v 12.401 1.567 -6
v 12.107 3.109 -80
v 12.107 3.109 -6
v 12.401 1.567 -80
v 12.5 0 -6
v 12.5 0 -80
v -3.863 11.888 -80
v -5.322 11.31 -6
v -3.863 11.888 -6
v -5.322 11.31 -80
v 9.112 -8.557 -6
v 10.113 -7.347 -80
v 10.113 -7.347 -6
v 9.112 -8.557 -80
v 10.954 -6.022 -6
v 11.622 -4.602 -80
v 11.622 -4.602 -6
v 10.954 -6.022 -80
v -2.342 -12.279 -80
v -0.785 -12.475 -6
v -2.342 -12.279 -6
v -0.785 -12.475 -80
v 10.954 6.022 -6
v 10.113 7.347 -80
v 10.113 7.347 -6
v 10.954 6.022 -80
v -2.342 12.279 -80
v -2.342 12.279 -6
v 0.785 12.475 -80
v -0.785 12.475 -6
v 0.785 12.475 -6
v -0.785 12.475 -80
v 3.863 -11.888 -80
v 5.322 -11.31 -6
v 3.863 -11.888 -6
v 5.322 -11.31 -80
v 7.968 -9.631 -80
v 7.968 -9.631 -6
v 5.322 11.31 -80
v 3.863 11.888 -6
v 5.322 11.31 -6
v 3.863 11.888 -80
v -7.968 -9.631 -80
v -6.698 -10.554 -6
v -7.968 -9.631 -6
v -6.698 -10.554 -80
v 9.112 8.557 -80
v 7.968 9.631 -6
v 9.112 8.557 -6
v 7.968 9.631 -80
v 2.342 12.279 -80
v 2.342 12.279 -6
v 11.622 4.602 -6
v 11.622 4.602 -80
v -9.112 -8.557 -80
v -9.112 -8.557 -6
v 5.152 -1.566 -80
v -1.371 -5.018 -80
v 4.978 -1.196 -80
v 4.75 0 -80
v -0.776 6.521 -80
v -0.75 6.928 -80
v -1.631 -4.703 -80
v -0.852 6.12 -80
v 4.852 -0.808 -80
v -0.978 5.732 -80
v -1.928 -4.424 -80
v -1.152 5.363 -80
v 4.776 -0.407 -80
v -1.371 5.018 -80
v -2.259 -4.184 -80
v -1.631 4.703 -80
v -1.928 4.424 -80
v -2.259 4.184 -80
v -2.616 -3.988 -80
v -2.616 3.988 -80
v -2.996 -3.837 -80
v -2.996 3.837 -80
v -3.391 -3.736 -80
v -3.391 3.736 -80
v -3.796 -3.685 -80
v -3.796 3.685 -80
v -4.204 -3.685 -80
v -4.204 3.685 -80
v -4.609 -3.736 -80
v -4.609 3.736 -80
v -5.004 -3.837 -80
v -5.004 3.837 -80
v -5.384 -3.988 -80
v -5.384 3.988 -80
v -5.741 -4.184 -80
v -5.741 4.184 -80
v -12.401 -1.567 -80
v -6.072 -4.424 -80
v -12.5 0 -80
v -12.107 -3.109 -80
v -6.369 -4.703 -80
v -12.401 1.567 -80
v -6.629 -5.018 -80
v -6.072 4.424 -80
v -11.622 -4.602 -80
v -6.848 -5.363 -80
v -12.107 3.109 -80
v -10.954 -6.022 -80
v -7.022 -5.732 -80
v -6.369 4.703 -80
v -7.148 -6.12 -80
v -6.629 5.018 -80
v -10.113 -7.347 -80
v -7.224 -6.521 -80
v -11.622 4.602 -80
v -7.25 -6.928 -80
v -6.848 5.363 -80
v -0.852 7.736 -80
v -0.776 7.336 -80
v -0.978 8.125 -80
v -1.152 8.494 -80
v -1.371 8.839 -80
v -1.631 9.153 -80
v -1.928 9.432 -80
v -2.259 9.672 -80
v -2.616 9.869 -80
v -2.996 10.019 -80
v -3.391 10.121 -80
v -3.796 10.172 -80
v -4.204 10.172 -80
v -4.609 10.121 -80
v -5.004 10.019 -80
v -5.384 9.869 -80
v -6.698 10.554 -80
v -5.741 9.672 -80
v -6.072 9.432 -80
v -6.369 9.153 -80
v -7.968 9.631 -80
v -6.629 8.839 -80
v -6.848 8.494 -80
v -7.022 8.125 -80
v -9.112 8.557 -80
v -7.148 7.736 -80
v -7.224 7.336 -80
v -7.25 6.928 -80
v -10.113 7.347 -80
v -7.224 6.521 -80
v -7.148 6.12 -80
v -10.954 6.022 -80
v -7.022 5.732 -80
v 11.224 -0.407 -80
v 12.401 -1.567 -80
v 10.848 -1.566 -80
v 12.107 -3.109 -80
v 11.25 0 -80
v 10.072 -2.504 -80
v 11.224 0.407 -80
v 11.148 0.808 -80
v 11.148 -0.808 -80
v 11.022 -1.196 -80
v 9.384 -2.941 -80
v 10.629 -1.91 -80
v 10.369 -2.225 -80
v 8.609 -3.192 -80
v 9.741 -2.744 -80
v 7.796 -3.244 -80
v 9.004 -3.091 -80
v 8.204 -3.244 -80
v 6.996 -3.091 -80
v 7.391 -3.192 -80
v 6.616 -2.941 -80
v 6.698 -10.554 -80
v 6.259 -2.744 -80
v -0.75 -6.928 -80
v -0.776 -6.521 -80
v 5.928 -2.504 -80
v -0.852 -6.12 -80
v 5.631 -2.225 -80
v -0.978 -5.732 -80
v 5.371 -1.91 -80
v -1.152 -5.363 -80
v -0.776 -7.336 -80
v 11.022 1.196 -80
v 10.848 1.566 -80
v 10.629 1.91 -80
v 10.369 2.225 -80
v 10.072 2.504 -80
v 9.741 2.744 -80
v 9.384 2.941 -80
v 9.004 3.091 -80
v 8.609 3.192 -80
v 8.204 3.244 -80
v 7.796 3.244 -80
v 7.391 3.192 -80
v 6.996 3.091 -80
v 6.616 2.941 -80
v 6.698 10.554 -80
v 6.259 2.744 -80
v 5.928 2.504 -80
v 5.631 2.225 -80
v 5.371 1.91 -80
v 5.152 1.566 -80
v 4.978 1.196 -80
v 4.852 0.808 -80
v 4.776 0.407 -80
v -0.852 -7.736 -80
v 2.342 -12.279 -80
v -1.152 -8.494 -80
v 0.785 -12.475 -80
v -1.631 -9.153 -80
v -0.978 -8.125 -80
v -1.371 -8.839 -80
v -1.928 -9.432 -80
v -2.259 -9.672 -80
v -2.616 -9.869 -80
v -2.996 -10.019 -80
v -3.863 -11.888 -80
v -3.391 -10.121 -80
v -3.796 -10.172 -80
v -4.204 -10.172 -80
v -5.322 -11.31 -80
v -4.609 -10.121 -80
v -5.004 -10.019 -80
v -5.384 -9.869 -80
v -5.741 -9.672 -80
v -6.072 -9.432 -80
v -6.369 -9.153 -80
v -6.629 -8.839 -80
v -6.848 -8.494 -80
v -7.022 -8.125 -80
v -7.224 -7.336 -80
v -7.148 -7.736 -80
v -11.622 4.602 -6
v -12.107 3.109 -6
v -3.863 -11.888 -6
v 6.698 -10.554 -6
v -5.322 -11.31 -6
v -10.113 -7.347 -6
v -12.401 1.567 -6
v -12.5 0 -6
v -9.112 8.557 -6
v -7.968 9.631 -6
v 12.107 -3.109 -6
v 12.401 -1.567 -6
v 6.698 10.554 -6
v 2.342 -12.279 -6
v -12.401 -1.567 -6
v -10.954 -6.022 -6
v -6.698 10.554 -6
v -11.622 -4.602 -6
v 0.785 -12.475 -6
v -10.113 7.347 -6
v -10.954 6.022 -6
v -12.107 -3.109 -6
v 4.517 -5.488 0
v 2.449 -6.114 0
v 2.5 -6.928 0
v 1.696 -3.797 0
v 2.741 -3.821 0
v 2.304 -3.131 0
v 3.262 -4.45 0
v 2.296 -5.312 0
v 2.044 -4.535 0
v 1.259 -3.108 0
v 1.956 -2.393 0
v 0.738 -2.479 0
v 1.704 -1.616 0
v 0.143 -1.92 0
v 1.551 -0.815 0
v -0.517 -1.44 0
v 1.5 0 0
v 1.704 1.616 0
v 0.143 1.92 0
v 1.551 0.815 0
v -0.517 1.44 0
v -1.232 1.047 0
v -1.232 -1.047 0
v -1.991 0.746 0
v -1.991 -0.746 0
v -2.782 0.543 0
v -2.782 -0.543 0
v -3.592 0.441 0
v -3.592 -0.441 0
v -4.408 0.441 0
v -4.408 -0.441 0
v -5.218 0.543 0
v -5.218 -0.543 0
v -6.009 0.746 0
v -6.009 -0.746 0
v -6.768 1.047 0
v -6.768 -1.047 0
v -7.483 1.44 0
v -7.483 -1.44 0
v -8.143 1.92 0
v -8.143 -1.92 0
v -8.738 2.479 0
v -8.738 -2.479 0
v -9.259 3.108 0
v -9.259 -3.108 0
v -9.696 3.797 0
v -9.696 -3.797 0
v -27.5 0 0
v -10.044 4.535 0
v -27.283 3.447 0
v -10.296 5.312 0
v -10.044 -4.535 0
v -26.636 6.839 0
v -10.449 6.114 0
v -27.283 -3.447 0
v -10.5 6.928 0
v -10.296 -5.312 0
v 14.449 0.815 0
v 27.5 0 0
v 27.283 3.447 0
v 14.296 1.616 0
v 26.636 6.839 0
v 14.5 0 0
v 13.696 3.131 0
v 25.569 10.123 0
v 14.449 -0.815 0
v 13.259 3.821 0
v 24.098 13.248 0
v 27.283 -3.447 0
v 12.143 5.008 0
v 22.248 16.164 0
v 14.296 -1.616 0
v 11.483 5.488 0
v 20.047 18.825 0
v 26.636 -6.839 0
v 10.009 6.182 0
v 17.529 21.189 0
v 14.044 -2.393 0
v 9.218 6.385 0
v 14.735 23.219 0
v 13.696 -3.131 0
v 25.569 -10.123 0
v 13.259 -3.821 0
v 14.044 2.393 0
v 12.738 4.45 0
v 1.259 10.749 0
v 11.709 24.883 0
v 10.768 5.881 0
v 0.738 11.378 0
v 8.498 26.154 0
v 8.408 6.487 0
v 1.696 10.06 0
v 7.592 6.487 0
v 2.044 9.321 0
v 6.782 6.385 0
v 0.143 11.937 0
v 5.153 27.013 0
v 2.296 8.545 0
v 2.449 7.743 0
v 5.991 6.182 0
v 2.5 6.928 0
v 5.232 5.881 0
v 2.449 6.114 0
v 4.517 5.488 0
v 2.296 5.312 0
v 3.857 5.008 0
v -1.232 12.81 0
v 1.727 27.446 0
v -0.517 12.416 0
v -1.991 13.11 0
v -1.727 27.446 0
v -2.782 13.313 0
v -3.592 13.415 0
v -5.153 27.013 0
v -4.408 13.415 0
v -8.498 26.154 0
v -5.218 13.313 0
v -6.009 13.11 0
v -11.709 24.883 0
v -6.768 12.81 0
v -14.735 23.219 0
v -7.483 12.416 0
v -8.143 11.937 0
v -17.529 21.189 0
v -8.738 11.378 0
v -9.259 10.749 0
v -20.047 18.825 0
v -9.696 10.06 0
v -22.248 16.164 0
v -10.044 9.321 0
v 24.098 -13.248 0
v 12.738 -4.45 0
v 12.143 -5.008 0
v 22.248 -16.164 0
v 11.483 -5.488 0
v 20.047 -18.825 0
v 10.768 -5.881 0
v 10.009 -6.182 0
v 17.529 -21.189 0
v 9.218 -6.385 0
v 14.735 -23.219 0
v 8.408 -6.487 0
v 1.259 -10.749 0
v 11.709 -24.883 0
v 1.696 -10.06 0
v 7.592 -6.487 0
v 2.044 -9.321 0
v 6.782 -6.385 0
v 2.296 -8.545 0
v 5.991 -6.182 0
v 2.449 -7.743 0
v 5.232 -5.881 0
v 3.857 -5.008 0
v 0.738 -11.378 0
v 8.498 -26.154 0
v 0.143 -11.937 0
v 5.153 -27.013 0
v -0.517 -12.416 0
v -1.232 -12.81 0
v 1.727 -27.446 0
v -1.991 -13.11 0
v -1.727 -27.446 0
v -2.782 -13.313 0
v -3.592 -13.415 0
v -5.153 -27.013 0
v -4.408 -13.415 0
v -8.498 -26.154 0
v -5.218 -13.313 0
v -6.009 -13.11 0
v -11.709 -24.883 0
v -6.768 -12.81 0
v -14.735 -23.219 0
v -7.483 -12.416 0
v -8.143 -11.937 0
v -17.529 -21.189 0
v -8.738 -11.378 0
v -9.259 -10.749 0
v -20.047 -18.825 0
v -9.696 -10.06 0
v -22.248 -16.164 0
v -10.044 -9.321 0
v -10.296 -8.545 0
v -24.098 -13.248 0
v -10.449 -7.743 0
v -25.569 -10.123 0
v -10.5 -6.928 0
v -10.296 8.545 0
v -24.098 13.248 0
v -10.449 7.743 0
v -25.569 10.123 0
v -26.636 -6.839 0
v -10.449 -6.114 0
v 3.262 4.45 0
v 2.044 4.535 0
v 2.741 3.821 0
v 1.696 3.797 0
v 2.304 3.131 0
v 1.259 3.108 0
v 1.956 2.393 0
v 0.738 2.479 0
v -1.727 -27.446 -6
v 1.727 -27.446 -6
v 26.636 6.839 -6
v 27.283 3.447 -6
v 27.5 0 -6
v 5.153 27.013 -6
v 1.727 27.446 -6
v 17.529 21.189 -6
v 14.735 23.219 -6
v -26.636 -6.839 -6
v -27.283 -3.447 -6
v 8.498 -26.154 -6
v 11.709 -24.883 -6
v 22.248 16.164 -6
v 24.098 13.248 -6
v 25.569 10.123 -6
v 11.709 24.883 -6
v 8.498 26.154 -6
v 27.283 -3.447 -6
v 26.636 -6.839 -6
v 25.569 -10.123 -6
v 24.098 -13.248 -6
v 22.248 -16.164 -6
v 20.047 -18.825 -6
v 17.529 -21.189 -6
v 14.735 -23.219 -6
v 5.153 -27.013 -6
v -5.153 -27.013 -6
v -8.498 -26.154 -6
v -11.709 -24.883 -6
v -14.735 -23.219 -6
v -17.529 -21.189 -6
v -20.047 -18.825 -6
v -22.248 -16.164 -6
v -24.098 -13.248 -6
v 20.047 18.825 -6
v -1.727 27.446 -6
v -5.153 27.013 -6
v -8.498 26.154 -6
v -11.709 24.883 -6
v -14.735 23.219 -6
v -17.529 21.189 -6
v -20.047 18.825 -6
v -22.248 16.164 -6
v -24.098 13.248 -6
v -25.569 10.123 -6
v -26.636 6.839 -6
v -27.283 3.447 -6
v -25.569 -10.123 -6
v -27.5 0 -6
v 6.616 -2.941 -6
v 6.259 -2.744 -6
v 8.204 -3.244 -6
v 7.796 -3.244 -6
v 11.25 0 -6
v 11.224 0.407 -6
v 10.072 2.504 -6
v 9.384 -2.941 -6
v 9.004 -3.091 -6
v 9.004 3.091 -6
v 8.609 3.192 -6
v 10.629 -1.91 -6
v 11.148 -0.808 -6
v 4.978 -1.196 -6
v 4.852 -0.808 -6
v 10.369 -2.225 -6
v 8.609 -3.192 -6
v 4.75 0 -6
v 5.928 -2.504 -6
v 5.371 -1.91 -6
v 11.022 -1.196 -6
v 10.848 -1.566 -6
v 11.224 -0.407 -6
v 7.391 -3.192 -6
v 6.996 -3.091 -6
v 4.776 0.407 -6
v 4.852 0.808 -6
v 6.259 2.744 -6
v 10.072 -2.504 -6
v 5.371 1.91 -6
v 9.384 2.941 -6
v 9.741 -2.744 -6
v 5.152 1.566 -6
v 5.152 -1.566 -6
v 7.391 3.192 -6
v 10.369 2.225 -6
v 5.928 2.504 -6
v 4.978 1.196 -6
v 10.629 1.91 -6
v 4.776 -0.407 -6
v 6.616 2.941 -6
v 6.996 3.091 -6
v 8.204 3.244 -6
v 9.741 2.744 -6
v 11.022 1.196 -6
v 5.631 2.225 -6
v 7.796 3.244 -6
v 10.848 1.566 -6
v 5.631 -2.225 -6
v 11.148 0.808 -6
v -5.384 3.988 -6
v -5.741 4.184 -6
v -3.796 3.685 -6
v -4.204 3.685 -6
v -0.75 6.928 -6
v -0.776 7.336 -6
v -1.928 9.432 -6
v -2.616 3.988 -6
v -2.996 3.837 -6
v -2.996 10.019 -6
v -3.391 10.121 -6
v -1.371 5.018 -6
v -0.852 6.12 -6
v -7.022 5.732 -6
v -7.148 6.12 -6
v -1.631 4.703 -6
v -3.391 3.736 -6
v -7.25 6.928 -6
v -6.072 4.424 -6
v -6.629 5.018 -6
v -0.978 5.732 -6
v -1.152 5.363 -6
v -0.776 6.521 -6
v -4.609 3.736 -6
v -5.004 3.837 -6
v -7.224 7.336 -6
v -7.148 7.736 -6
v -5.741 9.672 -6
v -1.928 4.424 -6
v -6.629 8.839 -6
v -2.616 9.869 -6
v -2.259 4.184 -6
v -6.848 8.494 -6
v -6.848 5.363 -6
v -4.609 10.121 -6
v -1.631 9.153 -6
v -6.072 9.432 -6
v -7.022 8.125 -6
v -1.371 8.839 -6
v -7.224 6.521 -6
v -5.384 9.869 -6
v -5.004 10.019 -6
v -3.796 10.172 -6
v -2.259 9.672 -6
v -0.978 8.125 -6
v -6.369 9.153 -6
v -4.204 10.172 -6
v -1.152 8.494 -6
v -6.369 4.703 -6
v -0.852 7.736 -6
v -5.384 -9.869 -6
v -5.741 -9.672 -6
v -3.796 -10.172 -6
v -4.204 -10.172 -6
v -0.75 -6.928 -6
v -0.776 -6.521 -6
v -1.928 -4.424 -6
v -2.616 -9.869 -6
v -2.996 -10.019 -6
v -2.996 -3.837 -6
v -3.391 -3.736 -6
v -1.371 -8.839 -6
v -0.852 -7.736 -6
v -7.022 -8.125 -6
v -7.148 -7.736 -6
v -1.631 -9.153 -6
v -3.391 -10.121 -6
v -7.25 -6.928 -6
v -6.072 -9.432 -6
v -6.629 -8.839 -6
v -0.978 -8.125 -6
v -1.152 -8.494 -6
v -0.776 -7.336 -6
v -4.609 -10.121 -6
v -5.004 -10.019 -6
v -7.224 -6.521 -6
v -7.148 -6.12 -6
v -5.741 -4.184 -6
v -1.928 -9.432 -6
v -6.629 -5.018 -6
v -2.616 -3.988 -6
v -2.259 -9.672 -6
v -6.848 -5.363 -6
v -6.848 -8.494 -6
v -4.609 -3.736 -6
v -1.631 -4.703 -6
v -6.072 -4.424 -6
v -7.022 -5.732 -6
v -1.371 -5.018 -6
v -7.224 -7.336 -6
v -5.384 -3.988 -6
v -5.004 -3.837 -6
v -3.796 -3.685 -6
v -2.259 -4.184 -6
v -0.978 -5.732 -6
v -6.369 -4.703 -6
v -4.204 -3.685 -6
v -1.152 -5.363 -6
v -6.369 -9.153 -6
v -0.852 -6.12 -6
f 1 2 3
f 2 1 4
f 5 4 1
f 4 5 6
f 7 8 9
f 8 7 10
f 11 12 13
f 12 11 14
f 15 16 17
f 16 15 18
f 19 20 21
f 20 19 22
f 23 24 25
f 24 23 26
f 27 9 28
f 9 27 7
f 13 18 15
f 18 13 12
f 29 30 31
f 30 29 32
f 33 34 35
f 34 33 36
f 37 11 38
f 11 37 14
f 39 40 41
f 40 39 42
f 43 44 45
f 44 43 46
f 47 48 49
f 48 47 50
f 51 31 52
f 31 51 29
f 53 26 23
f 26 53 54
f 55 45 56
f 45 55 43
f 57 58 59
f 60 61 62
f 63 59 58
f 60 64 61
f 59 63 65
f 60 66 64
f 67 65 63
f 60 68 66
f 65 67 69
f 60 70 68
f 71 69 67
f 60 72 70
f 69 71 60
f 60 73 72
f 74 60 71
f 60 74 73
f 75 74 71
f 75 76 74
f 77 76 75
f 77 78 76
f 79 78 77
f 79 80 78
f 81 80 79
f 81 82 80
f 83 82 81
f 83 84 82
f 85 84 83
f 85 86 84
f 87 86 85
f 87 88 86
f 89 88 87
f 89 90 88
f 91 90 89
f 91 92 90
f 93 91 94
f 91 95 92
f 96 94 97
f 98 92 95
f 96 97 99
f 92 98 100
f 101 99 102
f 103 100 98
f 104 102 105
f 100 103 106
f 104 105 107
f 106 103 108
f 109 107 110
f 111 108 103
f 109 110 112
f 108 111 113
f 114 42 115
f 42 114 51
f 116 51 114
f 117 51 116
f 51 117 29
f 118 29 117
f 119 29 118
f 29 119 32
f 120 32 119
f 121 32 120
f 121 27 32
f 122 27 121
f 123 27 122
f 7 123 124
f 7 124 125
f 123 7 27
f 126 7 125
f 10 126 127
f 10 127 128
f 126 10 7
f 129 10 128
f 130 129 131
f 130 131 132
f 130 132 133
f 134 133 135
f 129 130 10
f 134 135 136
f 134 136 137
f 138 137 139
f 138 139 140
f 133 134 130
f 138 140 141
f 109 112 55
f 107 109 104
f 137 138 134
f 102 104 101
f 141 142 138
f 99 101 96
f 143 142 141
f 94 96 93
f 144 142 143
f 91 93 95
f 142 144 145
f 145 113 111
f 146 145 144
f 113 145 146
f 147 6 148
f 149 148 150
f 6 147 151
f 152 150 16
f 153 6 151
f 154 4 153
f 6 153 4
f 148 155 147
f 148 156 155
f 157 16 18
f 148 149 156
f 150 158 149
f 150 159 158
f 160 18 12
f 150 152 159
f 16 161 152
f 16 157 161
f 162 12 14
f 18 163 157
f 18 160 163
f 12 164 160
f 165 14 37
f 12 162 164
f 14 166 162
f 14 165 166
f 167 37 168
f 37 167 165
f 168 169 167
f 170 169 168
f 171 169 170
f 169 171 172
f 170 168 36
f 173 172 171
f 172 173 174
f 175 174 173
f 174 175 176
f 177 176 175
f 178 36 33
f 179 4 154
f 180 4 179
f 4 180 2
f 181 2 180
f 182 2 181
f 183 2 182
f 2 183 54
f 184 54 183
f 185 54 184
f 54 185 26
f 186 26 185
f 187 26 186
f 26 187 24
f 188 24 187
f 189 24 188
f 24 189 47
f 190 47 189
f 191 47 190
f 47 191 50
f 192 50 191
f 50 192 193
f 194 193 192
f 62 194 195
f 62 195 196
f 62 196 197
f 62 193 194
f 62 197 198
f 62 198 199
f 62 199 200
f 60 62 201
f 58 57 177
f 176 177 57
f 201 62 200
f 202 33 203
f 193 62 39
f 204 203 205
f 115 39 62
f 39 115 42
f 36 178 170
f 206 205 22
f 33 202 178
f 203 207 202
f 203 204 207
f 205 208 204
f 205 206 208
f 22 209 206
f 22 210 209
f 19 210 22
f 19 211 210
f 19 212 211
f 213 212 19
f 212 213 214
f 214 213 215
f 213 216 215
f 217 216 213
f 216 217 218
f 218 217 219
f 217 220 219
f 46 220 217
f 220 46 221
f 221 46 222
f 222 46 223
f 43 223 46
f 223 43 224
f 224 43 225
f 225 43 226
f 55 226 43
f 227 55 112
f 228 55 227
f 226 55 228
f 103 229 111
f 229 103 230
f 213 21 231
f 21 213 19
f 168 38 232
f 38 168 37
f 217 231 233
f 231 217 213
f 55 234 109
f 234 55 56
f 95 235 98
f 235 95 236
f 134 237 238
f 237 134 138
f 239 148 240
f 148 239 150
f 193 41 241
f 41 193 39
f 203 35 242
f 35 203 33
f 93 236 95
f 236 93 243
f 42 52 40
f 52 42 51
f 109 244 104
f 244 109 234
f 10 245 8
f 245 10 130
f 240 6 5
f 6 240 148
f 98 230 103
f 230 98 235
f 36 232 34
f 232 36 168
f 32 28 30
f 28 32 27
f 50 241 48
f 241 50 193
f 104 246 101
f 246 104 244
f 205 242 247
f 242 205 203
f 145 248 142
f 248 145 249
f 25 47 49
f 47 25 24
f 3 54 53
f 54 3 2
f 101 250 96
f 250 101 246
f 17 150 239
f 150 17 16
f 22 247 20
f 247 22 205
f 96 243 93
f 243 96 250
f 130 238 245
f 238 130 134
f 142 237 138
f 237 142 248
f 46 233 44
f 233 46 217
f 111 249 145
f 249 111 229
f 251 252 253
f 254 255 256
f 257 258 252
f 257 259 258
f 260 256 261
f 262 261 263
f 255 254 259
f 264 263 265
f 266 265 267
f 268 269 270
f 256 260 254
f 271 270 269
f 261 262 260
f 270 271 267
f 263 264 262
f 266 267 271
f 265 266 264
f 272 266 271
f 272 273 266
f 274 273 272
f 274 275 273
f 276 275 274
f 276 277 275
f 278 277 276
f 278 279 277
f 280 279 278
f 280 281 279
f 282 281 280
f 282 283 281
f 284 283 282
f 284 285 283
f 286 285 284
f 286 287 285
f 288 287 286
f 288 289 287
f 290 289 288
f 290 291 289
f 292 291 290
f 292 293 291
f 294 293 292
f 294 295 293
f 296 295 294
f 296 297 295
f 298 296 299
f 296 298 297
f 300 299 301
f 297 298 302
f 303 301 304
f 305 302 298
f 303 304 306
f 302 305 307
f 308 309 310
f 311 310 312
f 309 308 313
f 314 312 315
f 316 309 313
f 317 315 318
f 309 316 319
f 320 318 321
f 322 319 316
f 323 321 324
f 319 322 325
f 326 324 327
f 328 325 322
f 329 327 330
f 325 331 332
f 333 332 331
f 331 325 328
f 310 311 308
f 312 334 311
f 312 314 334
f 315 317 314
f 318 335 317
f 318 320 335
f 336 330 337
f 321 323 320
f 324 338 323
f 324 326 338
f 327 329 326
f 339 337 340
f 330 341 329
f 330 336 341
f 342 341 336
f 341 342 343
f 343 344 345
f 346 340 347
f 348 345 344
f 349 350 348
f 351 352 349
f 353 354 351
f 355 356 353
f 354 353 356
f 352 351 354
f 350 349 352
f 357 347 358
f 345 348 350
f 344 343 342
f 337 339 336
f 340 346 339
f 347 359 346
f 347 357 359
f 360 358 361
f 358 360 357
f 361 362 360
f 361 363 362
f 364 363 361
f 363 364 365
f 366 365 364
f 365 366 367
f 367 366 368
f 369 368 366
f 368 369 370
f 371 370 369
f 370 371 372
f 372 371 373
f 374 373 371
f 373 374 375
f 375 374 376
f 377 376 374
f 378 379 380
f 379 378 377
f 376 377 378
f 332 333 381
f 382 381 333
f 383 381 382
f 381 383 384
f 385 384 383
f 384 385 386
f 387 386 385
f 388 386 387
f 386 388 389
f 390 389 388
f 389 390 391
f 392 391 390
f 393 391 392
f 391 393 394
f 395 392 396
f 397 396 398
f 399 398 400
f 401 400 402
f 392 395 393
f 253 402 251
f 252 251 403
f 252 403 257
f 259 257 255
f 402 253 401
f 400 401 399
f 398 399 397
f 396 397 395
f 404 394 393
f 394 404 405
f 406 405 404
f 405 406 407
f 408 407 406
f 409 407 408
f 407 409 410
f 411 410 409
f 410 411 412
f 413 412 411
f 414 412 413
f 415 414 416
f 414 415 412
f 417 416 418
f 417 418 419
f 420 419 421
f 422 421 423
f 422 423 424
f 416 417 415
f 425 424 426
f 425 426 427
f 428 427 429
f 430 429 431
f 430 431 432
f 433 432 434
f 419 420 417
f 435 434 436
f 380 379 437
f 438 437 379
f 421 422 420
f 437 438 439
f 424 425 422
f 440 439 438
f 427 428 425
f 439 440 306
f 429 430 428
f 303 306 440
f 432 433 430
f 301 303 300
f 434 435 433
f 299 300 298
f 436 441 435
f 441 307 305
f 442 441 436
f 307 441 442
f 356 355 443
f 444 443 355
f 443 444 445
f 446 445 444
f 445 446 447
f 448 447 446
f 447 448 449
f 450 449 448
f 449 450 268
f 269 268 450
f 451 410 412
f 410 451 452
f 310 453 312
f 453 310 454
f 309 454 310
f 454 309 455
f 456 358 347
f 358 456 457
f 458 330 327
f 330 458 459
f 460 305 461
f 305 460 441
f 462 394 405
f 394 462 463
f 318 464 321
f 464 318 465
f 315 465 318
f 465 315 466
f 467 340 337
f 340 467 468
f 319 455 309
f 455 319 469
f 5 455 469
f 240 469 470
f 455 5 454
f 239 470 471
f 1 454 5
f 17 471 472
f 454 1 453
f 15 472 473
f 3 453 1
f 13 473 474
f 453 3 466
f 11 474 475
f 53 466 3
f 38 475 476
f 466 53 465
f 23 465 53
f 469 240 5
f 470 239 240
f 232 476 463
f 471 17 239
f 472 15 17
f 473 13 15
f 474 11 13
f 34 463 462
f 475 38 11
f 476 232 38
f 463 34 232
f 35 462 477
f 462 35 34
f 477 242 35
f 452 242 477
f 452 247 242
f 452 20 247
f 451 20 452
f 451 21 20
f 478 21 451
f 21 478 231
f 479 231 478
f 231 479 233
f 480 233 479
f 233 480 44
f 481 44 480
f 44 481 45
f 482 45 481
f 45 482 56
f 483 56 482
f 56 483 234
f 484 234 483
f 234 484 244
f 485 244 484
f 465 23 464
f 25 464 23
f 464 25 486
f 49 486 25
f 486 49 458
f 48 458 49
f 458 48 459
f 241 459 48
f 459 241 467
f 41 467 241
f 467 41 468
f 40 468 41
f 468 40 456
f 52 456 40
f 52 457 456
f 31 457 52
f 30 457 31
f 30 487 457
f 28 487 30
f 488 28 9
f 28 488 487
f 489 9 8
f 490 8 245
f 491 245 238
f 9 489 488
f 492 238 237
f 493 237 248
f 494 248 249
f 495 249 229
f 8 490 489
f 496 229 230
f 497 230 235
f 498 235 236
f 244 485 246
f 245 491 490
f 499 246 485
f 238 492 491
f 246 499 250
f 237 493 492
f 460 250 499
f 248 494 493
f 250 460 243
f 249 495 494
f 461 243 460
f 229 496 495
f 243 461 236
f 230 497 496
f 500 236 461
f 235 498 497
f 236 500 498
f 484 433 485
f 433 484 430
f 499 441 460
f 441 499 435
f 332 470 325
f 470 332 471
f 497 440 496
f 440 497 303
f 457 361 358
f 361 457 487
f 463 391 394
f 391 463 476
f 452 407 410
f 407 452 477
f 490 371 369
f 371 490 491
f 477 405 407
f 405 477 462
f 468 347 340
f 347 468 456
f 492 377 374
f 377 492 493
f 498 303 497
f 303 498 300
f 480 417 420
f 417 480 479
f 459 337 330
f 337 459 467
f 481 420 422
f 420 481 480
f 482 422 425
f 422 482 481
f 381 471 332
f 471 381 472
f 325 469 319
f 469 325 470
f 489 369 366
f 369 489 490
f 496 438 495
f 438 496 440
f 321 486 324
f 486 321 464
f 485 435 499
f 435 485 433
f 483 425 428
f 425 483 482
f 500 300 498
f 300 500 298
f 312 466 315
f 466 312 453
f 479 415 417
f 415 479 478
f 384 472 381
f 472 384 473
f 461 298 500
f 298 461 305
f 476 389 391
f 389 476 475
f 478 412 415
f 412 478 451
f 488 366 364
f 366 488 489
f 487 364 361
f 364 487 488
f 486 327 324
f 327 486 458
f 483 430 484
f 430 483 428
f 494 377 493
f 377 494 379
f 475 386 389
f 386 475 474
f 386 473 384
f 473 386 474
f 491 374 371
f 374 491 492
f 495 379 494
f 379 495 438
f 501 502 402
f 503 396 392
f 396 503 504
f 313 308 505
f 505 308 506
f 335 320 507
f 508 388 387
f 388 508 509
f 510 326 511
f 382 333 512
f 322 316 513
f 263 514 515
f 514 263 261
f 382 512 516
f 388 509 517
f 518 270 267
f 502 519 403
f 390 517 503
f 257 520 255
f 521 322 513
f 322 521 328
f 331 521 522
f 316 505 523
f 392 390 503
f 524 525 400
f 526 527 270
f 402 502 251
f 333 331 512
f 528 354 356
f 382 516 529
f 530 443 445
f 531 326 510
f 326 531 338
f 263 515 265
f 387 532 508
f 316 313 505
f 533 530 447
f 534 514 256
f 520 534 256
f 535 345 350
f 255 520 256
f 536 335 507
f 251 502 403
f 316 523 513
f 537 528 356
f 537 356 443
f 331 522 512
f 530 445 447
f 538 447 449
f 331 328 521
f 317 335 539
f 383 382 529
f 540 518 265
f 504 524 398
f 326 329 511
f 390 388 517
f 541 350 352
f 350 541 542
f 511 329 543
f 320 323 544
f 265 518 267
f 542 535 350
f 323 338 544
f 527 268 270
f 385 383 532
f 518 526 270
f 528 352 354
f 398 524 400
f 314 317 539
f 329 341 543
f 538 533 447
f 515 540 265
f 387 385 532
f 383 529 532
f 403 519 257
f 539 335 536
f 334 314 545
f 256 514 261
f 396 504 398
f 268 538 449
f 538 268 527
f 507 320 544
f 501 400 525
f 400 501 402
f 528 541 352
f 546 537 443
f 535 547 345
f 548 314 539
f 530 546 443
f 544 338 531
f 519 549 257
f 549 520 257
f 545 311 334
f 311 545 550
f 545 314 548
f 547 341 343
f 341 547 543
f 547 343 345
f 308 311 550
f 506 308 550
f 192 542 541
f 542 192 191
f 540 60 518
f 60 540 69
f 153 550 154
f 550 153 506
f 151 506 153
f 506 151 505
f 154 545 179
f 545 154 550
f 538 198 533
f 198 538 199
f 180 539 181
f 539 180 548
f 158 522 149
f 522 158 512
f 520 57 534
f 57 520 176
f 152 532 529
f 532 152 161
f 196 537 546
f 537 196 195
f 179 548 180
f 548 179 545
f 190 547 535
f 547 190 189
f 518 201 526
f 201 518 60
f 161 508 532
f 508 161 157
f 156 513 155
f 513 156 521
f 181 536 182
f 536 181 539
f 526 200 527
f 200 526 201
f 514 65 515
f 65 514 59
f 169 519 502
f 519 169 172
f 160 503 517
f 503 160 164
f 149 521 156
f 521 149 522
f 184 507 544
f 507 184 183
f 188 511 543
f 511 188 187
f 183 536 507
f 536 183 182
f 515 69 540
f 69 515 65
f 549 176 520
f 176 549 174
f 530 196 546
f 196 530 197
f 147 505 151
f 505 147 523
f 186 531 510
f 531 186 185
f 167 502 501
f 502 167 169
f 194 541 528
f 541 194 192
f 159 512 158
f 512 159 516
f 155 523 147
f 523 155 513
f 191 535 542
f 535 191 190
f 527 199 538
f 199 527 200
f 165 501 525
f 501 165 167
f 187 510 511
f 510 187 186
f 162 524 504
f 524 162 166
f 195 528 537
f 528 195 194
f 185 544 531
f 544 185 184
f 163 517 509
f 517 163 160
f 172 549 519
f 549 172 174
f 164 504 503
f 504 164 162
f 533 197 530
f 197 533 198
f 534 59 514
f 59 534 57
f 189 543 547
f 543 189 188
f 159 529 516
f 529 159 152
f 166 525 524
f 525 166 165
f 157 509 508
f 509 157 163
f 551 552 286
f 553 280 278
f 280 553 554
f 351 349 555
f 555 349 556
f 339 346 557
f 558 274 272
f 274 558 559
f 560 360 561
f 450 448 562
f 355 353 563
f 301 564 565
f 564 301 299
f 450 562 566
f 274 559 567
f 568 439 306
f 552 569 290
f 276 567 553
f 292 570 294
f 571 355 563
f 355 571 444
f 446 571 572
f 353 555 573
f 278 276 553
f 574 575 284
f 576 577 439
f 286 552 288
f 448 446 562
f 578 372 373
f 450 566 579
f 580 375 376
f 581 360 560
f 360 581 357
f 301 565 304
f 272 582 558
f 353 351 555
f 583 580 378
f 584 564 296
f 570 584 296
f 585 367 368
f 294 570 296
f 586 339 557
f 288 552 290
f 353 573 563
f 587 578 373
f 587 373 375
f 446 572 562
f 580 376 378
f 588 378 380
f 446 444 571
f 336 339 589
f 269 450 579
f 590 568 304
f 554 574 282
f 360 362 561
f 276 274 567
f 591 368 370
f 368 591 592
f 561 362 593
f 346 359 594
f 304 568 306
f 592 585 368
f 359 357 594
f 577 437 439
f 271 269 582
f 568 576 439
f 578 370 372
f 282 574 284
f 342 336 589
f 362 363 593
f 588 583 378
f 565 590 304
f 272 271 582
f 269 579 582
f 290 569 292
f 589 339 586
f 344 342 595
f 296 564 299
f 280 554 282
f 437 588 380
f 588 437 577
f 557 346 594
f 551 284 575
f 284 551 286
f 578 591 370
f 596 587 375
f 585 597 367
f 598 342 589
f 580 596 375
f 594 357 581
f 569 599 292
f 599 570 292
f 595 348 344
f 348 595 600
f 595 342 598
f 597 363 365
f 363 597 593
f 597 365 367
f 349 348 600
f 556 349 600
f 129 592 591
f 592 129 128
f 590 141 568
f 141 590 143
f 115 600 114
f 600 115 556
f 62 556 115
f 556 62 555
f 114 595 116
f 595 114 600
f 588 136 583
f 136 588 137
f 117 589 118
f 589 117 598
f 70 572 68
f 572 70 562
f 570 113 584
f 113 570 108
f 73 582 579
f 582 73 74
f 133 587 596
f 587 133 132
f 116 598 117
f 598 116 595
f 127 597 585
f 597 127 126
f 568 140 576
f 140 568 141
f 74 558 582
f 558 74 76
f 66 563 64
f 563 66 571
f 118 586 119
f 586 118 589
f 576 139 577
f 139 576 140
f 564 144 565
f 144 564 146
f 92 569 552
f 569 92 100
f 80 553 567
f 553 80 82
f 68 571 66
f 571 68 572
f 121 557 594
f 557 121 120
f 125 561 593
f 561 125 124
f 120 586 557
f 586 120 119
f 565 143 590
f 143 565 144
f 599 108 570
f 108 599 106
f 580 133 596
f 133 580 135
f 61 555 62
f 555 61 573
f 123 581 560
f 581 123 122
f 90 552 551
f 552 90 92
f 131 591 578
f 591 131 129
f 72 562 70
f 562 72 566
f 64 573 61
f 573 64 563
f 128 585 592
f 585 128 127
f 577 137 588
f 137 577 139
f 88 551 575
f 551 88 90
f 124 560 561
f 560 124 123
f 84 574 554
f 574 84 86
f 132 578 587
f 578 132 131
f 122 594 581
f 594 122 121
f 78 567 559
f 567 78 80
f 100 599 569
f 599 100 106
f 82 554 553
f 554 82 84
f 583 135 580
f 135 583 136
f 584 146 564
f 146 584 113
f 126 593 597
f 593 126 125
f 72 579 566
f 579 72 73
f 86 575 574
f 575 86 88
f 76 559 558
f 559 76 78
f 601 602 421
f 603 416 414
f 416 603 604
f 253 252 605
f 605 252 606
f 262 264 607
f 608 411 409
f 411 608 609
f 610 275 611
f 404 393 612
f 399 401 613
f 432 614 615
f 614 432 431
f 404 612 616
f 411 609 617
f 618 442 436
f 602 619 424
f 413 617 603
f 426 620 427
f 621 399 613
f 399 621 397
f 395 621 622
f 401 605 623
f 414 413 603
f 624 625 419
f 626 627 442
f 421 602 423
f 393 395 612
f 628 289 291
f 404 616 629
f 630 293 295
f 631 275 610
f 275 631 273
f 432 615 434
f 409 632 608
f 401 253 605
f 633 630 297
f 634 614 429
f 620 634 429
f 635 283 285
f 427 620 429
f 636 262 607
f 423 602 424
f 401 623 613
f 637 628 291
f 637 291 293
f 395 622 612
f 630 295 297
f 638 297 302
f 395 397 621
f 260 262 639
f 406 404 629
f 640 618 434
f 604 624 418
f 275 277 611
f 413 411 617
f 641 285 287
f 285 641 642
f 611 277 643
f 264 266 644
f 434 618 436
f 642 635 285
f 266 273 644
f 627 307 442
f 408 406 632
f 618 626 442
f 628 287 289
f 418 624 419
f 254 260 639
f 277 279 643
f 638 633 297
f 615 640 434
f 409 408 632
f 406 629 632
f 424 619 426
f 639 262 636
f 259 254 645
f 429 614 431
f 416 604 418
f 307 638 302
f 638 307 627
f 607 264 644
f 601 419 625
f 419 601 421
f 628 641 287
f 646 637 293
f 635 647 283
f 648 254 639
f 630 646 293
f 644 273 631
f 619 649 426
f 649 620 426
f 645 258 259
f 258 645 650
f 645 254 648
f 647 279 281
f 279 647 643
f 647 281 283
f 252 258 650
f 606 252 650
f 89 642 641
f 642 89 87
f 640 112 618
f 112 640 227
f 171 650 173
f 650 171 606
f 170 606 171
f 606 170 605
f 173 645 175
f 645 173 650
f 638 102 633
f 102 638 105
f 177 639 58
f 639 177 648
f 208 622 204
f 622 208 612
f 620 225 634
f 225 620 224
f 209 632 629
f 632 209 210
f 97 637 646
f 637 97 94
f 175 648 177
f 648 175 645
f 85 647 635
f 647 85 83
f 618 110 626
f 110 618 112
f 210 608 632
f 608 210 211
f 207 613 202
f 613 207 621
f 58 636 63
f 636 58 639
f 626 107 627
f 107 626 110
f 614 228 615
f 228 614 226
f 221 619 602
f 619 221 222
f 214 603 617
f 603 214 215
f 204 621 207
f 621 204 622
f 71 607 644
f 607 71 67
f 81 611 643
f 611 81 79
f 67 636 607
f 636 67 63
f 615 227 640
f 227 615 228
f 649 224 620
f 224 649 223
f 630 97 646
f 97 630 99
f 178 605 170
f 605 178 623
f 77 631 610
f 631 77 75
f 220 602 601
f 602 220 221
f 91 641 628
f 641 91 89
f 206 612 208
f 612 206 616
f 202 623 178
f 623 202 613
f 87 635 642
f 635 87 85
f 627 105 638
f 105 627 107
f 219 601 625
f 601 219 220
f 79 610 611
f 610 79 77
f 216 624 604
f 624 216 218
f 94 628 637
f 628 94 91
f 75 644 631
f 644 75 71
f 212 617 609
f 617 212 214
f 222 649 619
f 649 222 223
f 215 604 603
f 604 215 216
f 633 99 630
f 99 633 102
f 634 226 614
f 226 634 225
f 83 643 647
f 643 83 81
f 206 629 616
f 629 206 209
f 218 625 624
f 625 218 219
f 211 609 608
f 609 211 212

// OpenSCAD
$fn = 50;


difference() {
	union() {
		translate(v = [0, 0, -80.0000000000]) {
			cylinder(h = 80, r = 12.5000000000);
		}
		translate(v = [0, 0, -6.0000000000]) {
			cylinder(h = 6, r = 27.5000000000);
		}
	}
	union() {
		translate(v = [8.0000000000, 0.0000000000, 0]) {
			rotate(a = [0, 0, 0]) {
				difference() {
					union() {
						#translate(v = [0, 0, -80.0000000000]) {
							cylinder(h = 80, r = 2.2500000000);
						}
						#translate(v = [0, 0, -6]) {
							cylinder(h = 6, r = 12.5000000000, r1 = 3.2500000000, r2 = 6.5000000000);
						}
						#translate(v = [0, 0, -80.0000000000]) {
							cylinder(h = 80, r = 3.2500000000);
						}
						#translate(v = [0, 0, -80.0000000000]) {
							cylinder(h = 80, r = 2.2500000000);
						}
					}
					union();
				}
			}
		}
		translate(v = [-4.0000000000, 6.9282032303, 0]) {
			rotate(a = [0, 0, 0]) {
				difference() {
					union() {
						#translate(v = [0, 0, -80.0000000000]) {
							cylinder(h = 80, r = 2.2500000000);
						}
						#translate(v = [0, 0, -6]) {
							cylinder(h = 6, r = 12.5000000000, r1 = 3.2500000000, r2 = 6.5000000000);
						}
						#translate(v = [0, 0, -80.0000000000]) {
							cylinder(h = 80, r = 3.2500000000);
						}
						#translate(v = [0, 0, -80.0000000000]) {
							cylinder(h = 80, r = 2.2500000000);
						}
					}
					union();
				}
			}
		}
		translate(v = [-4.0000000000, -6.9282032303, 0]) {
			rotate(a = [0, 0, 0]) {
				difference() {
					union() {
						#translate(v = [0, 0, -80.0000000000]) {
							cylinder(h = 80, r = 2.2500000000);
						}
						#translate(v = [0, 0, -6]) {
							cylinder(h = 6, r = 12.5000000000, r1 = 3.2500000000, r2 = 6.5000000000);
						}
						#translate(v = [0, 0, -80.0000000000]) {
							cylinder(h = 80, r = 3.2500000000);
						}
						#translate(v = [0, 0, -80.0000000000]) {
							cylinder(h = 80, r = 2.2500000000);
						}
					}
					union();
				}
			}
		}
	}
}
